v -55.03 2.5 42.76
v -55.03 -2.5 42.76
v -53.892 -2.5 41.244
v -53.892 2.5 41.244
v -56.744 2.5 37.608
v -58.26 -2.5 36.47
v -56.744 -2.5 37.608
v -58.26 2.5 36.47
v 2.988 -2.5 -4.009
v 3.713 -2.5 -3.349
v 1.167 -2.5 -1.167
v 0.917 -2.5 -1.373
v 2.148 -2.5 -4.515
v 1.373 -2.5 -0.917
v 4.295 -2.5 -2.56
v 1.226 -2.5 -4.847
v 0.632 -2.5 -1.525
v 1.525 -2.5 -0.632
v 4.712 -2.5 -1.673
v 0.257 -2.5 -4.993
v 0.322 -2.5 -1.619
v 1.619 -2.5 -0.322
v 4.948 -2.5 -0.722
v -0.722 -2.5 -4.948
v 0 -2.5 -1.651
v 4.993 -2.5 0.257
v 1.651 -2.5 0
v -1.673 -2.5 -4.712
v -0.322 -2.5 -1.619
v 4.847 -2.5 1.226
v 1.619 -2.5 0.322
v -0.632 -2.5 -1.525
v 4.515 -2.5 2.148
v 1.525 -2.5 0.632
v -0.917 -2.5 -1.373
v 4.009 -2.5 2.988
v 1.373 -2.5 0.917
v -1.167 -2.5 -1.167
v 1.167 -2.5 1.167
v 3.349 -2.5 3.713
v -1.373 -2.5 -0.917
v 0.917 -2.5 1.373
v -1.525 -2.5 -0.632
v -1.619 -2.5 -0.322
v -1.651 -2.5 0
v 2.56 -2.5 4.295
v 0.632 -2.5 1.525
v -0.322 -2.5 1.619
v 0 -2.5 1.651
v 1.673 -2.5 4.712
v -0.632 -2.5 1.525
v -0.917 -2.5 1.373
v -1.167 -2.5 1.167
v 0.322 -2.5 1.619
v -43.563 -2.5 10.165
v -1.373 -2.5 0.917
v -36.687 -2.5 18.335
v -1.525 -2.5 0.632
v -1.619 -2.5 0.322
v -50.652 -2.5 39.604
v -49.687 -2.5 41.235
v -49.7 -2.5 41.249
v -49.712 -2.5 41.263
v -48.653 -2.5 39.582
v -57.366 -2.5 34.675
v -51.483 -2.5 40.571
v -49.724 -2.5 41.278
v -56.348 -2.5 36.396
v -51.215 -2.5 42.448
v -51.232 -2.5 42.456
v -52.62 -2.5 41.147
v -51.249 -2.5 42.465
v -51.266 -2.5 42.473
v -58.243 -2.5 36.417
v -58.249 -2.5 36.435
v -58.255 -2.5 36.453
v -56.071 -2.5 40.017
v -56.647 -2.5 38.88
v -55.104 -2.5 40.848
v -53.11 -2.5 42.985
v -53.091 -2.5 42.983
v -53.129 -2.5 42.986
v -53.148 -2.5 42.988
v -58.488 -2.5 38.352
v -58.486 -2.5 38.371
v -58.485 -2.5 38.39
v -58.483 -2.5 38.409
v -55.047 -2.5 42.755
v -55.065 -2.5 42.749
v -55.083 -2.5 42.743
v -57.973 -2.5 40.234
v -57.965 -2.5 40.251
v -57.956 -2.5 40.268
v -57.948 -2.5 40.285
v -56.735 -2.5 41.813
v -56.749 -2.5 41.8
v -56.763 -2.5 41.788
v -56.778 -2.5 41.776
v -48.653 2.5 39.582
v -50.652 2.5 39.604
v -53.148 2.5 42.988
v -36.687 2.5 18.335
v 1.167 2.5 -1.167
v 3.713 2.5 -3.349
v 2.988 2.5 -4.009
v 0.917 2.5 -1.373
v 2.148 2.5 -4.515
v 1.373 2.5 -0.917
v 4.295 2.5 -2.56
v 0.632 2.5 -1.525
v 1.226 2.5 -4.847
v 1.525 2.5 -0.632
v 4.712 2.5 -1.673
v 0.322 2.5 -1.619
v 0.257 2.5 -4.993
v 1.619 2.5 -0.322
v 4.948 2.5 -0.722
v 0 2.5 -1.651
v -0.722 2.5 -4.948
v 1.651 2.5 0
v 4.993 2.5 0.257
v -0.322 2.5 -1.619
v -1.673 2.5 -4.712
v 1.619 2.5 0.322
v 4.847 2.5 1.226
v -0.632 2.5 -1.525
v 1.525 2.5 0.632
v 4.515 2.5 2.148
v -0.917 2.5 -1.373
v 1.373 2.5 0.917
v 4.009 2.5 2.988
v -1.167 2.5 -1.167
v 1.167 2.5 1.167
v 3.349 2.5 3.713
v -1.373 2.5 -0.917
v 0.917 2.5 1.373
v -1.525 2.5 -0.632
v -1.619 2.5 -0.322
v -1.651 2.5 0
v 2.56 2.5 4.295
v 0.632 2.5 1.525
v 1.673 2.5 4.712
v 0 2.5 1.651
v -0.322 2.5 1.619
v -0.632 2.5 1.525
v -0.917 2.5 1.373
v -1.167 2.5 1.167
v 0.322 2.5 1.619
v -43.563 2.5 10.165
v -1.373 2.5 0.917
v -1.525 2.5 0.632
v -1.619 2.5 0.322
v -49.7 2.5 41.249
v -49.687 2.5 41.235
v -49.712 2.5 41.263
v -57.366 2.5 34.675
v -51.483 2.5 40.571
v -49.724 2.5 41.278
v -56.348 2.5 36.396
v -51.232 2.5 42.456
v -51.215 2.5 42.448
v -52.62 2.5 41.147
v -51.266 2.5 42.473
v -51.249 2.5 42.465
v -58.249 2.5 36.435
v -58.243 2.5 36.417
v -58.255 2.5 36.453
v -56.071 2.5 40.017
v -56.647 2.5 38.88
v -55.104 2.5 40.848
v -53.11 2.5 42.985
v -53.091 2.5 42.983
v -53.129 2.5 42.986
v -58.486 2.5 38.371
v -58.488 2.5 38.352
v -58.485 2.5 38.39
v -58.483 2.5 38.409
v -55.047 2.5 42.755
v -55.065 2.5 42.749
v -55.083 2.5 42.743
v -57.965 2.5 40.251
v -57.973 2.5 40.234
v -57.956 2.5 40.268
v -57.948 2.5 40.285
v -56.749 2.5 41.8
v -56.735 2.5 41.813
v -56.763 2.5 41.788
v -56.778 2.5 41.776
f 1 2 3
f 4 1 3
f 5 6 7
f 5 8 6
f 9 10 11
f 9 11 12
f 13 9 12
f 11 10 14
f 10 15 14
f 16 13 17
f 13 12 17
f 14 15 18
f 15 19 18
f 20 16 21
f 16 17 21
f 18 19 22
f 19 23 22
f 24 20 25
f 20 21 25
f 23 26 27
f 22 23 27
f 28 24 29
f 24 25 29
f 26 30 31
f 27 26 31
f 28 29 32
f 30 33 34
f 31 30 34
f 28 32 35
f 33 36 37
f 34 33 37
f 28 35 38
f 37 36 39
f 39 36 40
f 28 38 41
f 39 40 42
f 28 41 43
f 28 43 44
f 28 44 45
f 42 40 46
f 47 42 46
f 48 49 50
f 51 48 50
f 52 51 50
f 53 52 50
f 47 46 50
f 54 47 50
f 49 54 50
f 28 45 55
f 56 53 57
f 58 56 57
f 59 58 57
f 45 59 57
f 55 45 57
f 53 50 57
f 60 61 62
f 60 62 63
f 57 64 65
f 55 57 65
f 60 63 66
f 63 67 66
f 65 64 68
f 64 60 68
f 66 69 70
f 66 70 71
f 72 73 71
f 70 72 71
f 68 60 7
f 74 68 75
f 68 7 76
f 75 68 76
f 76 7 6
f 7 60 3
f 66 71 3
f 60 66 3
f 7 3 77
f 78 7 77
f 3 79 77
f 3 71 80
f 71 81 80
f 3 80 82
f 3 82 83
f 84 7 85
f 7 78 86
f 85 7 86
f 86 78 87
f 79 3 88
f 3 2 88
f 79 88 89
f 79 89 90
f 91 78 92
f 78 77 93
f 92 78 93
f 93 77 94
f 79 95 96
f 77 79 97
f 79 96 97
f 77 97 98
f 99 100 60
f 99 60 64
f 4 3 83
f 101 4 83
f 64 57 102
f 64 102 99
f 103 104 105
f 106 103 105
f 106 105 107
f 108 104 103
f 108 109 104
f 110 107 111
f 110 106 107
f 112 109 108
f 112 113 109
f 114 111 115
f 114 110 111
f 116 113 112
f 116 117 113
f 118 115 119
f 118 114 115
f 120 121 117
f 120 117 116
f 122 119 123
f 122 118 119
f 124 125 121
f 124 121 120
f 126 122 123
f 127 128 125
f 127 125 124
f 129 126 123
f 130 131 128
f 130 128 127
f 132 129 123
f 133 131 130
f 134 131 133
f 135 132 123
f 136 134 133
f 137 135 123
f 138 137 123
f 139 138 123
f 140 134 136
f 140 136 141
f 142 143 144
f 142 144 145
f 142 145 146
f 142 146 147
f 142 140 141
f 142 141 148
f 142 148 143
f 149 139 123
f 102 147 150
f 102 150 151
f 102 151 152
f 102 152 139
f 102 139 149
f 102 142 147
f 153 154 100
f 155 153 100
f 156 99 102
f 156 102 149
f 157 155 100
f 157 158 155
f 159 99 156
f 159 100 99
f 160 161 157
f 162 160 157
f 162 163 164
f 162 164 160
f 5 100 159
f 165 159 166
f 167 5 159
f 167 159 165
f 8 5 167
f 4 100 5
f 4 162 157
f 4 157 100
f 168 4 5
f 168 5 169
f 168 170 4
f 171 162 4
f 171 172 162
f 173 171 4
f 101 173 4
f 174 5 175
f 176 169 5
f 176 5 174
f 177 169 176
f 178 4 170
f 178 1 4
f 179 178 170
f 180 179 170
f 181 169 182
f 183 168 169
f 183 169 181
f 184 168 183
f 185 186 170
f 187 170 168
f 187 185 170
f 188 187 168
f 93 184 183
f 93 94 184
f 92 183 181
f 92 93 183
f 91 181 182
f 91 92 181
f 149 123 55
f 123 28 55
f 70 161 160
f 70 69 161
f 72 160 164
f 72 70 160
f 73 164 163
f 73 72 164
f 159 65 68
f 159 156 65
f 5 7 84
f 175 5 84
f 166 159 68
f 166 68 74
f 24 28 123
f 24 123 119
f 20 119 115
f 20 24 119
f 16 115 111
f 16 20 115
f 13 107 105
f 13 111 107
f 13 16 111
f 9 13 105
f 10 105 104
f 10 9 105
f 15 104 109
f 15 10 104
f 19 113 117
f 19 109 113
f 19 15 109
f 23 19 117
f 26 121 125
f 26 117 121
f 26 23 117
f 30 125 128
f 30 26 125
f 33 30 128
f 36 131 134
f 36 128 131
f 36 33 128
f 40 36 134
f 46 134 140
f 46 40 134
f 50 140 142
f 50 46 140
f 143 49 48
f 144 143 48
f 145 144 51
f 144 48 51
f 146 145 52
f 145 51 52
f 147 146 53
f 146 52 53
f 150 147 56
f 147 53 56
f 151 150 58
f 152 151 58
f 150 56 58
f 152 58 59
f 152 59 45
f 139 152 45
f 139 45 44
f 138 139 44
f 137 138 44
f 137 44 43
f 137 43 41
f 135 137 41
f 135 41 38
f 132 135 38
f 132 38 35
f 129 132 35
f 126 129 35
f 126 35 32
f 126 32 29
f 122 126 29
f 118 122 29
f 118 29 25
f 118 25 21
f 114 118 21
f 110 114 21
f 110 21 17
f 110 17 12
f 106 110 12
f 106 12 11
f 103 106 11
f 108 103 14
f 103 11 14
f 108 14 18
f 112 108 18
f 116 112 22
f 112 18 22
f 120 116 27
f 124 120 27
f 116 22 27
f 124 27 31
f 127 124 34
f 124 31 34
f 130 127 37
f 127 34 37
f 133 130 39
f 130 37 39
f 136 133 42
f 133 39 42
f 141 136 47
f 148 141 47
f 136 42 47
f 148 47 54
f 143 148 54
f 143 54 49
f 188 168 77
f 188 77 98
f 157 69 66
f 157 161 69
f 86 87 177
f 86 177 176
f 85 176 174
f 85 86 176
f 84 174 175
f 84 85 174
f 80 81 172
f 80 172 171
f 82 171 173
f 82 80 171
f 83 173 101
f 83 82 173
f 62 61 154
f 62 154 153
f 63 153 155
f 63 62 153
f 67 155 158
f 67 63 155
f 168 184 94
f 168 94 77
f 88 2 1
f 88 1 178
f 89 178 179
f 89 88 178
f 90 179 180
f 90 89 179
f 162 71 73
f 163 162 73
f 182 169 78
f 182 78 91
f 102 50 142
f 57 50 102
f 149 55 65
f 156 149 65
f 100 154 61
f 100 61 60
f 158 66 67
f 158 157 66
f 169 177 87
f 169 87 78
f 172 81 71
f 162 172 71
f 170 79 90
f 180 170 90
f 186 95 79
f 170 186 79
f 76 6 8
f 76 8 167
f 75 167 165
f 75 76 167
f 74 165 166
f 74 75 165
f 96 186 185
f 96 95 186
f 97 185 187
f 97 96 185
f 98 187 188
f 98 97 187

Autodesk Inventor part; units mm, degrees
ref_plane "YZ Plane" through (0, 0, 0) normal (1, 0, 0) x (0, 1, 0)
ref_plane "XZ Plane" through (0, 0, 0) normal (0, 1, 0) x (-1, 0, 0)
ref_plane "XY Plane" through (0, 0, 0) normal (0, 0, 1) x (1, 0, 0)
sketch "Sketch1" plane through (0, 0, 0) normal (0, 1, 0) x (-1, 0, 0)
  line L0 (53.5, 38) -> (40.125, 14.25)
  line L1 (40.125, 14.25) -> (0, 0)
  line L2 (1.6733, -4.7117) -> (43.5628, 10.165)
  line L3 (43.5628, 10.165) -> (57.8567, 35.5465)
  line L4 (-1.6733, 4.7117) -> (36.6872, 18.335)
  line L5 (36.6872, 18.335) -> (49.1433, 40.4535)
  arc A0 (-1.6733, 4.7117) -> (1.6733, -4.7117) centre (0, 0) ccw
  arc A1 (57.8567, 35.5465) -> (49.1433, 40.4535) centre (53.5, 38) ccw
  dimension "d0" = 5
  dimension "d1" = 5
  dimension "d2" = 40.7078
  dimension "d3" = 5
  dimension "d4" = 25.3847
  dimension "d5" = 29.1297
  dimension "d6" = 53.5
extrude "Extrusion1" add sketch "Sketch1" along normal mid plane 5
sketch "Sketch2" plane through (0, 2.5, 0) normal (0, 1, 0) x (1, 0, 0)
  point P0 (0, 0)
  point P1 (0, 0)
hole "Hole1" at (0, 2.5, 0) direction (0, -1, 0) diameter 3.302 depth 12.3 tip angle 118 thread size "8-32 UNC" class "2B" standard "ANSI Unified Screw Threads"
sketch "Sketch3" plane through (0, 2.5, 0) normal (0, 1, 0) x (1, 0, 0)
  line L0 (-50.6525, -39.6036) -> (-48.6527, -39.5822)
  line L1 (-48.6527, -39.5822) -> (-49.634, -41.3248)
  line L2 (-49.634, -41.3248) -> (-50.6525, -39.6036)
  arc A0 (-57.8567, -35.5465) -> (-49.1433, -40.4535) centre (-53.5, -38) ccw projected
  line L3 (-49.1433, -40.4535) -> (-36.6872, -18.335) projected
  line L4 (-36.6872, -18.335) -> (-49.1433, -40.4535) projected
  line L5 (-49.1433, -40.4535) -> (-57.8567, -35.5465)
  line L6 (-51.4829, -40.5712) -> (-49.6271, -41.3167)
  line L7 (-49.6271, -41.3167) -> (-51.2007, -42.5512)
  line L8 (-51.2007, -42.5512) -> (-51.4829, -40.5712)
  line L9 (-52.6204, -41.1474) -> (-51.1912, -42.5463)
  line L10 (-51.1912, -42.5463) -> (-53.1174, -43.0846)
  line L11 (-53.1174, -43.0846) -> (-52.6204, -41.1474)
  line L12 (-53.8918, -41.2444) -> (-53.1067, -43.0838)
  line L13 (-53.1067, -43.0838) -> (-55.0923, -42.844)
  line L14 (-55.0923, -42.844) -> (-53.8918, -41.2444)
  line L15 (-55.1036, -40.8475) -> (-55.0822, -42.8473)
  line L16 (-55.0822, -42.8473) -> (-56.8248, -41.866)
  line L17 (-56.8248, -41.866) -> (-55.1036, -40.8475)
  line L18 (-56.0712, -40.0171) -> (-56.8167, -41.8729)
  line L19 (-56.8167, -41.8729) -> (-58.0512, -40.2993)
  line L20 (-58.0512, -40.2993) -> (-56.0712, -40.0171)
  line L21 (-56.6474, -38.8796) -> (-58.0463, -40.3088)
  line L22 (-58.0463, -40.3088) -> (-58.5846, -38.3826)
  line L23 (-58.5846, -38.3826) -> (-56.6474, -38.8796)
  line L24 (-56.7444, -37.6082) -> (-58.5838, -38.3933)
  line L25 (-58.5838, -38.3933) -> (-58.344, -36.4077)
  line L26 (-58.344, -36.4077) -> (-56.7444, -37.6082)
  line L27 (-56.3475, -36.3964) -> (-58.3473, -36.4178)
  line L28 (-58.3473, -36.4178) -> (-57.366, -34.6752)
  line L29 (-57.366, -34.6752) -> (-56.3475, -36.3964)
  point P0 (0, 0)
  point P1 (-49.6464, -40.1702)
  point P2 (-50.7702, -41.4797)
  point P3 (-52.3096, -42.2594)
  point P4 (-54.0303, -42.3907)
  point P5 (-55.6702, -41.8536)
  point P6 (-56.9797, -40.7298)
  point P7 (-57.7594, -39.1904)
  point P8 (-57.8907, -37.4697)
  point P9 (-57.3536, -35.8298)
  dimension "d16" = 2
  dimension "d19" = 180
extrude "Extrusion2" cut sketch "Sketch3" against normal through all contours L5 A0 L2 | L0 L1 L5 | A0 L1 L2 | L27 A0 L5 | L5 L28 L29 | L7 A0 L6 | A0 L8 L6 | A0 L27 L28 | L7 L8 A0 | L26 A0 L25 | L26 L24 A0 | L10 A0 L9 | A0 L24 L25 | A0 L11 L9 | L10 L11 A0 | L23 A0 L22 | L13 A0 L12 | L23 L21 A0 | A0 L21 L22 | A0 L14 L12 | L13 L14 A0 | L20 A0 L19 | L16 A0 L15 | L20 L18 A0 | A0 L18 L19 | A0 L17 L15 | L16 L17 A0
properties part number "Finger"
